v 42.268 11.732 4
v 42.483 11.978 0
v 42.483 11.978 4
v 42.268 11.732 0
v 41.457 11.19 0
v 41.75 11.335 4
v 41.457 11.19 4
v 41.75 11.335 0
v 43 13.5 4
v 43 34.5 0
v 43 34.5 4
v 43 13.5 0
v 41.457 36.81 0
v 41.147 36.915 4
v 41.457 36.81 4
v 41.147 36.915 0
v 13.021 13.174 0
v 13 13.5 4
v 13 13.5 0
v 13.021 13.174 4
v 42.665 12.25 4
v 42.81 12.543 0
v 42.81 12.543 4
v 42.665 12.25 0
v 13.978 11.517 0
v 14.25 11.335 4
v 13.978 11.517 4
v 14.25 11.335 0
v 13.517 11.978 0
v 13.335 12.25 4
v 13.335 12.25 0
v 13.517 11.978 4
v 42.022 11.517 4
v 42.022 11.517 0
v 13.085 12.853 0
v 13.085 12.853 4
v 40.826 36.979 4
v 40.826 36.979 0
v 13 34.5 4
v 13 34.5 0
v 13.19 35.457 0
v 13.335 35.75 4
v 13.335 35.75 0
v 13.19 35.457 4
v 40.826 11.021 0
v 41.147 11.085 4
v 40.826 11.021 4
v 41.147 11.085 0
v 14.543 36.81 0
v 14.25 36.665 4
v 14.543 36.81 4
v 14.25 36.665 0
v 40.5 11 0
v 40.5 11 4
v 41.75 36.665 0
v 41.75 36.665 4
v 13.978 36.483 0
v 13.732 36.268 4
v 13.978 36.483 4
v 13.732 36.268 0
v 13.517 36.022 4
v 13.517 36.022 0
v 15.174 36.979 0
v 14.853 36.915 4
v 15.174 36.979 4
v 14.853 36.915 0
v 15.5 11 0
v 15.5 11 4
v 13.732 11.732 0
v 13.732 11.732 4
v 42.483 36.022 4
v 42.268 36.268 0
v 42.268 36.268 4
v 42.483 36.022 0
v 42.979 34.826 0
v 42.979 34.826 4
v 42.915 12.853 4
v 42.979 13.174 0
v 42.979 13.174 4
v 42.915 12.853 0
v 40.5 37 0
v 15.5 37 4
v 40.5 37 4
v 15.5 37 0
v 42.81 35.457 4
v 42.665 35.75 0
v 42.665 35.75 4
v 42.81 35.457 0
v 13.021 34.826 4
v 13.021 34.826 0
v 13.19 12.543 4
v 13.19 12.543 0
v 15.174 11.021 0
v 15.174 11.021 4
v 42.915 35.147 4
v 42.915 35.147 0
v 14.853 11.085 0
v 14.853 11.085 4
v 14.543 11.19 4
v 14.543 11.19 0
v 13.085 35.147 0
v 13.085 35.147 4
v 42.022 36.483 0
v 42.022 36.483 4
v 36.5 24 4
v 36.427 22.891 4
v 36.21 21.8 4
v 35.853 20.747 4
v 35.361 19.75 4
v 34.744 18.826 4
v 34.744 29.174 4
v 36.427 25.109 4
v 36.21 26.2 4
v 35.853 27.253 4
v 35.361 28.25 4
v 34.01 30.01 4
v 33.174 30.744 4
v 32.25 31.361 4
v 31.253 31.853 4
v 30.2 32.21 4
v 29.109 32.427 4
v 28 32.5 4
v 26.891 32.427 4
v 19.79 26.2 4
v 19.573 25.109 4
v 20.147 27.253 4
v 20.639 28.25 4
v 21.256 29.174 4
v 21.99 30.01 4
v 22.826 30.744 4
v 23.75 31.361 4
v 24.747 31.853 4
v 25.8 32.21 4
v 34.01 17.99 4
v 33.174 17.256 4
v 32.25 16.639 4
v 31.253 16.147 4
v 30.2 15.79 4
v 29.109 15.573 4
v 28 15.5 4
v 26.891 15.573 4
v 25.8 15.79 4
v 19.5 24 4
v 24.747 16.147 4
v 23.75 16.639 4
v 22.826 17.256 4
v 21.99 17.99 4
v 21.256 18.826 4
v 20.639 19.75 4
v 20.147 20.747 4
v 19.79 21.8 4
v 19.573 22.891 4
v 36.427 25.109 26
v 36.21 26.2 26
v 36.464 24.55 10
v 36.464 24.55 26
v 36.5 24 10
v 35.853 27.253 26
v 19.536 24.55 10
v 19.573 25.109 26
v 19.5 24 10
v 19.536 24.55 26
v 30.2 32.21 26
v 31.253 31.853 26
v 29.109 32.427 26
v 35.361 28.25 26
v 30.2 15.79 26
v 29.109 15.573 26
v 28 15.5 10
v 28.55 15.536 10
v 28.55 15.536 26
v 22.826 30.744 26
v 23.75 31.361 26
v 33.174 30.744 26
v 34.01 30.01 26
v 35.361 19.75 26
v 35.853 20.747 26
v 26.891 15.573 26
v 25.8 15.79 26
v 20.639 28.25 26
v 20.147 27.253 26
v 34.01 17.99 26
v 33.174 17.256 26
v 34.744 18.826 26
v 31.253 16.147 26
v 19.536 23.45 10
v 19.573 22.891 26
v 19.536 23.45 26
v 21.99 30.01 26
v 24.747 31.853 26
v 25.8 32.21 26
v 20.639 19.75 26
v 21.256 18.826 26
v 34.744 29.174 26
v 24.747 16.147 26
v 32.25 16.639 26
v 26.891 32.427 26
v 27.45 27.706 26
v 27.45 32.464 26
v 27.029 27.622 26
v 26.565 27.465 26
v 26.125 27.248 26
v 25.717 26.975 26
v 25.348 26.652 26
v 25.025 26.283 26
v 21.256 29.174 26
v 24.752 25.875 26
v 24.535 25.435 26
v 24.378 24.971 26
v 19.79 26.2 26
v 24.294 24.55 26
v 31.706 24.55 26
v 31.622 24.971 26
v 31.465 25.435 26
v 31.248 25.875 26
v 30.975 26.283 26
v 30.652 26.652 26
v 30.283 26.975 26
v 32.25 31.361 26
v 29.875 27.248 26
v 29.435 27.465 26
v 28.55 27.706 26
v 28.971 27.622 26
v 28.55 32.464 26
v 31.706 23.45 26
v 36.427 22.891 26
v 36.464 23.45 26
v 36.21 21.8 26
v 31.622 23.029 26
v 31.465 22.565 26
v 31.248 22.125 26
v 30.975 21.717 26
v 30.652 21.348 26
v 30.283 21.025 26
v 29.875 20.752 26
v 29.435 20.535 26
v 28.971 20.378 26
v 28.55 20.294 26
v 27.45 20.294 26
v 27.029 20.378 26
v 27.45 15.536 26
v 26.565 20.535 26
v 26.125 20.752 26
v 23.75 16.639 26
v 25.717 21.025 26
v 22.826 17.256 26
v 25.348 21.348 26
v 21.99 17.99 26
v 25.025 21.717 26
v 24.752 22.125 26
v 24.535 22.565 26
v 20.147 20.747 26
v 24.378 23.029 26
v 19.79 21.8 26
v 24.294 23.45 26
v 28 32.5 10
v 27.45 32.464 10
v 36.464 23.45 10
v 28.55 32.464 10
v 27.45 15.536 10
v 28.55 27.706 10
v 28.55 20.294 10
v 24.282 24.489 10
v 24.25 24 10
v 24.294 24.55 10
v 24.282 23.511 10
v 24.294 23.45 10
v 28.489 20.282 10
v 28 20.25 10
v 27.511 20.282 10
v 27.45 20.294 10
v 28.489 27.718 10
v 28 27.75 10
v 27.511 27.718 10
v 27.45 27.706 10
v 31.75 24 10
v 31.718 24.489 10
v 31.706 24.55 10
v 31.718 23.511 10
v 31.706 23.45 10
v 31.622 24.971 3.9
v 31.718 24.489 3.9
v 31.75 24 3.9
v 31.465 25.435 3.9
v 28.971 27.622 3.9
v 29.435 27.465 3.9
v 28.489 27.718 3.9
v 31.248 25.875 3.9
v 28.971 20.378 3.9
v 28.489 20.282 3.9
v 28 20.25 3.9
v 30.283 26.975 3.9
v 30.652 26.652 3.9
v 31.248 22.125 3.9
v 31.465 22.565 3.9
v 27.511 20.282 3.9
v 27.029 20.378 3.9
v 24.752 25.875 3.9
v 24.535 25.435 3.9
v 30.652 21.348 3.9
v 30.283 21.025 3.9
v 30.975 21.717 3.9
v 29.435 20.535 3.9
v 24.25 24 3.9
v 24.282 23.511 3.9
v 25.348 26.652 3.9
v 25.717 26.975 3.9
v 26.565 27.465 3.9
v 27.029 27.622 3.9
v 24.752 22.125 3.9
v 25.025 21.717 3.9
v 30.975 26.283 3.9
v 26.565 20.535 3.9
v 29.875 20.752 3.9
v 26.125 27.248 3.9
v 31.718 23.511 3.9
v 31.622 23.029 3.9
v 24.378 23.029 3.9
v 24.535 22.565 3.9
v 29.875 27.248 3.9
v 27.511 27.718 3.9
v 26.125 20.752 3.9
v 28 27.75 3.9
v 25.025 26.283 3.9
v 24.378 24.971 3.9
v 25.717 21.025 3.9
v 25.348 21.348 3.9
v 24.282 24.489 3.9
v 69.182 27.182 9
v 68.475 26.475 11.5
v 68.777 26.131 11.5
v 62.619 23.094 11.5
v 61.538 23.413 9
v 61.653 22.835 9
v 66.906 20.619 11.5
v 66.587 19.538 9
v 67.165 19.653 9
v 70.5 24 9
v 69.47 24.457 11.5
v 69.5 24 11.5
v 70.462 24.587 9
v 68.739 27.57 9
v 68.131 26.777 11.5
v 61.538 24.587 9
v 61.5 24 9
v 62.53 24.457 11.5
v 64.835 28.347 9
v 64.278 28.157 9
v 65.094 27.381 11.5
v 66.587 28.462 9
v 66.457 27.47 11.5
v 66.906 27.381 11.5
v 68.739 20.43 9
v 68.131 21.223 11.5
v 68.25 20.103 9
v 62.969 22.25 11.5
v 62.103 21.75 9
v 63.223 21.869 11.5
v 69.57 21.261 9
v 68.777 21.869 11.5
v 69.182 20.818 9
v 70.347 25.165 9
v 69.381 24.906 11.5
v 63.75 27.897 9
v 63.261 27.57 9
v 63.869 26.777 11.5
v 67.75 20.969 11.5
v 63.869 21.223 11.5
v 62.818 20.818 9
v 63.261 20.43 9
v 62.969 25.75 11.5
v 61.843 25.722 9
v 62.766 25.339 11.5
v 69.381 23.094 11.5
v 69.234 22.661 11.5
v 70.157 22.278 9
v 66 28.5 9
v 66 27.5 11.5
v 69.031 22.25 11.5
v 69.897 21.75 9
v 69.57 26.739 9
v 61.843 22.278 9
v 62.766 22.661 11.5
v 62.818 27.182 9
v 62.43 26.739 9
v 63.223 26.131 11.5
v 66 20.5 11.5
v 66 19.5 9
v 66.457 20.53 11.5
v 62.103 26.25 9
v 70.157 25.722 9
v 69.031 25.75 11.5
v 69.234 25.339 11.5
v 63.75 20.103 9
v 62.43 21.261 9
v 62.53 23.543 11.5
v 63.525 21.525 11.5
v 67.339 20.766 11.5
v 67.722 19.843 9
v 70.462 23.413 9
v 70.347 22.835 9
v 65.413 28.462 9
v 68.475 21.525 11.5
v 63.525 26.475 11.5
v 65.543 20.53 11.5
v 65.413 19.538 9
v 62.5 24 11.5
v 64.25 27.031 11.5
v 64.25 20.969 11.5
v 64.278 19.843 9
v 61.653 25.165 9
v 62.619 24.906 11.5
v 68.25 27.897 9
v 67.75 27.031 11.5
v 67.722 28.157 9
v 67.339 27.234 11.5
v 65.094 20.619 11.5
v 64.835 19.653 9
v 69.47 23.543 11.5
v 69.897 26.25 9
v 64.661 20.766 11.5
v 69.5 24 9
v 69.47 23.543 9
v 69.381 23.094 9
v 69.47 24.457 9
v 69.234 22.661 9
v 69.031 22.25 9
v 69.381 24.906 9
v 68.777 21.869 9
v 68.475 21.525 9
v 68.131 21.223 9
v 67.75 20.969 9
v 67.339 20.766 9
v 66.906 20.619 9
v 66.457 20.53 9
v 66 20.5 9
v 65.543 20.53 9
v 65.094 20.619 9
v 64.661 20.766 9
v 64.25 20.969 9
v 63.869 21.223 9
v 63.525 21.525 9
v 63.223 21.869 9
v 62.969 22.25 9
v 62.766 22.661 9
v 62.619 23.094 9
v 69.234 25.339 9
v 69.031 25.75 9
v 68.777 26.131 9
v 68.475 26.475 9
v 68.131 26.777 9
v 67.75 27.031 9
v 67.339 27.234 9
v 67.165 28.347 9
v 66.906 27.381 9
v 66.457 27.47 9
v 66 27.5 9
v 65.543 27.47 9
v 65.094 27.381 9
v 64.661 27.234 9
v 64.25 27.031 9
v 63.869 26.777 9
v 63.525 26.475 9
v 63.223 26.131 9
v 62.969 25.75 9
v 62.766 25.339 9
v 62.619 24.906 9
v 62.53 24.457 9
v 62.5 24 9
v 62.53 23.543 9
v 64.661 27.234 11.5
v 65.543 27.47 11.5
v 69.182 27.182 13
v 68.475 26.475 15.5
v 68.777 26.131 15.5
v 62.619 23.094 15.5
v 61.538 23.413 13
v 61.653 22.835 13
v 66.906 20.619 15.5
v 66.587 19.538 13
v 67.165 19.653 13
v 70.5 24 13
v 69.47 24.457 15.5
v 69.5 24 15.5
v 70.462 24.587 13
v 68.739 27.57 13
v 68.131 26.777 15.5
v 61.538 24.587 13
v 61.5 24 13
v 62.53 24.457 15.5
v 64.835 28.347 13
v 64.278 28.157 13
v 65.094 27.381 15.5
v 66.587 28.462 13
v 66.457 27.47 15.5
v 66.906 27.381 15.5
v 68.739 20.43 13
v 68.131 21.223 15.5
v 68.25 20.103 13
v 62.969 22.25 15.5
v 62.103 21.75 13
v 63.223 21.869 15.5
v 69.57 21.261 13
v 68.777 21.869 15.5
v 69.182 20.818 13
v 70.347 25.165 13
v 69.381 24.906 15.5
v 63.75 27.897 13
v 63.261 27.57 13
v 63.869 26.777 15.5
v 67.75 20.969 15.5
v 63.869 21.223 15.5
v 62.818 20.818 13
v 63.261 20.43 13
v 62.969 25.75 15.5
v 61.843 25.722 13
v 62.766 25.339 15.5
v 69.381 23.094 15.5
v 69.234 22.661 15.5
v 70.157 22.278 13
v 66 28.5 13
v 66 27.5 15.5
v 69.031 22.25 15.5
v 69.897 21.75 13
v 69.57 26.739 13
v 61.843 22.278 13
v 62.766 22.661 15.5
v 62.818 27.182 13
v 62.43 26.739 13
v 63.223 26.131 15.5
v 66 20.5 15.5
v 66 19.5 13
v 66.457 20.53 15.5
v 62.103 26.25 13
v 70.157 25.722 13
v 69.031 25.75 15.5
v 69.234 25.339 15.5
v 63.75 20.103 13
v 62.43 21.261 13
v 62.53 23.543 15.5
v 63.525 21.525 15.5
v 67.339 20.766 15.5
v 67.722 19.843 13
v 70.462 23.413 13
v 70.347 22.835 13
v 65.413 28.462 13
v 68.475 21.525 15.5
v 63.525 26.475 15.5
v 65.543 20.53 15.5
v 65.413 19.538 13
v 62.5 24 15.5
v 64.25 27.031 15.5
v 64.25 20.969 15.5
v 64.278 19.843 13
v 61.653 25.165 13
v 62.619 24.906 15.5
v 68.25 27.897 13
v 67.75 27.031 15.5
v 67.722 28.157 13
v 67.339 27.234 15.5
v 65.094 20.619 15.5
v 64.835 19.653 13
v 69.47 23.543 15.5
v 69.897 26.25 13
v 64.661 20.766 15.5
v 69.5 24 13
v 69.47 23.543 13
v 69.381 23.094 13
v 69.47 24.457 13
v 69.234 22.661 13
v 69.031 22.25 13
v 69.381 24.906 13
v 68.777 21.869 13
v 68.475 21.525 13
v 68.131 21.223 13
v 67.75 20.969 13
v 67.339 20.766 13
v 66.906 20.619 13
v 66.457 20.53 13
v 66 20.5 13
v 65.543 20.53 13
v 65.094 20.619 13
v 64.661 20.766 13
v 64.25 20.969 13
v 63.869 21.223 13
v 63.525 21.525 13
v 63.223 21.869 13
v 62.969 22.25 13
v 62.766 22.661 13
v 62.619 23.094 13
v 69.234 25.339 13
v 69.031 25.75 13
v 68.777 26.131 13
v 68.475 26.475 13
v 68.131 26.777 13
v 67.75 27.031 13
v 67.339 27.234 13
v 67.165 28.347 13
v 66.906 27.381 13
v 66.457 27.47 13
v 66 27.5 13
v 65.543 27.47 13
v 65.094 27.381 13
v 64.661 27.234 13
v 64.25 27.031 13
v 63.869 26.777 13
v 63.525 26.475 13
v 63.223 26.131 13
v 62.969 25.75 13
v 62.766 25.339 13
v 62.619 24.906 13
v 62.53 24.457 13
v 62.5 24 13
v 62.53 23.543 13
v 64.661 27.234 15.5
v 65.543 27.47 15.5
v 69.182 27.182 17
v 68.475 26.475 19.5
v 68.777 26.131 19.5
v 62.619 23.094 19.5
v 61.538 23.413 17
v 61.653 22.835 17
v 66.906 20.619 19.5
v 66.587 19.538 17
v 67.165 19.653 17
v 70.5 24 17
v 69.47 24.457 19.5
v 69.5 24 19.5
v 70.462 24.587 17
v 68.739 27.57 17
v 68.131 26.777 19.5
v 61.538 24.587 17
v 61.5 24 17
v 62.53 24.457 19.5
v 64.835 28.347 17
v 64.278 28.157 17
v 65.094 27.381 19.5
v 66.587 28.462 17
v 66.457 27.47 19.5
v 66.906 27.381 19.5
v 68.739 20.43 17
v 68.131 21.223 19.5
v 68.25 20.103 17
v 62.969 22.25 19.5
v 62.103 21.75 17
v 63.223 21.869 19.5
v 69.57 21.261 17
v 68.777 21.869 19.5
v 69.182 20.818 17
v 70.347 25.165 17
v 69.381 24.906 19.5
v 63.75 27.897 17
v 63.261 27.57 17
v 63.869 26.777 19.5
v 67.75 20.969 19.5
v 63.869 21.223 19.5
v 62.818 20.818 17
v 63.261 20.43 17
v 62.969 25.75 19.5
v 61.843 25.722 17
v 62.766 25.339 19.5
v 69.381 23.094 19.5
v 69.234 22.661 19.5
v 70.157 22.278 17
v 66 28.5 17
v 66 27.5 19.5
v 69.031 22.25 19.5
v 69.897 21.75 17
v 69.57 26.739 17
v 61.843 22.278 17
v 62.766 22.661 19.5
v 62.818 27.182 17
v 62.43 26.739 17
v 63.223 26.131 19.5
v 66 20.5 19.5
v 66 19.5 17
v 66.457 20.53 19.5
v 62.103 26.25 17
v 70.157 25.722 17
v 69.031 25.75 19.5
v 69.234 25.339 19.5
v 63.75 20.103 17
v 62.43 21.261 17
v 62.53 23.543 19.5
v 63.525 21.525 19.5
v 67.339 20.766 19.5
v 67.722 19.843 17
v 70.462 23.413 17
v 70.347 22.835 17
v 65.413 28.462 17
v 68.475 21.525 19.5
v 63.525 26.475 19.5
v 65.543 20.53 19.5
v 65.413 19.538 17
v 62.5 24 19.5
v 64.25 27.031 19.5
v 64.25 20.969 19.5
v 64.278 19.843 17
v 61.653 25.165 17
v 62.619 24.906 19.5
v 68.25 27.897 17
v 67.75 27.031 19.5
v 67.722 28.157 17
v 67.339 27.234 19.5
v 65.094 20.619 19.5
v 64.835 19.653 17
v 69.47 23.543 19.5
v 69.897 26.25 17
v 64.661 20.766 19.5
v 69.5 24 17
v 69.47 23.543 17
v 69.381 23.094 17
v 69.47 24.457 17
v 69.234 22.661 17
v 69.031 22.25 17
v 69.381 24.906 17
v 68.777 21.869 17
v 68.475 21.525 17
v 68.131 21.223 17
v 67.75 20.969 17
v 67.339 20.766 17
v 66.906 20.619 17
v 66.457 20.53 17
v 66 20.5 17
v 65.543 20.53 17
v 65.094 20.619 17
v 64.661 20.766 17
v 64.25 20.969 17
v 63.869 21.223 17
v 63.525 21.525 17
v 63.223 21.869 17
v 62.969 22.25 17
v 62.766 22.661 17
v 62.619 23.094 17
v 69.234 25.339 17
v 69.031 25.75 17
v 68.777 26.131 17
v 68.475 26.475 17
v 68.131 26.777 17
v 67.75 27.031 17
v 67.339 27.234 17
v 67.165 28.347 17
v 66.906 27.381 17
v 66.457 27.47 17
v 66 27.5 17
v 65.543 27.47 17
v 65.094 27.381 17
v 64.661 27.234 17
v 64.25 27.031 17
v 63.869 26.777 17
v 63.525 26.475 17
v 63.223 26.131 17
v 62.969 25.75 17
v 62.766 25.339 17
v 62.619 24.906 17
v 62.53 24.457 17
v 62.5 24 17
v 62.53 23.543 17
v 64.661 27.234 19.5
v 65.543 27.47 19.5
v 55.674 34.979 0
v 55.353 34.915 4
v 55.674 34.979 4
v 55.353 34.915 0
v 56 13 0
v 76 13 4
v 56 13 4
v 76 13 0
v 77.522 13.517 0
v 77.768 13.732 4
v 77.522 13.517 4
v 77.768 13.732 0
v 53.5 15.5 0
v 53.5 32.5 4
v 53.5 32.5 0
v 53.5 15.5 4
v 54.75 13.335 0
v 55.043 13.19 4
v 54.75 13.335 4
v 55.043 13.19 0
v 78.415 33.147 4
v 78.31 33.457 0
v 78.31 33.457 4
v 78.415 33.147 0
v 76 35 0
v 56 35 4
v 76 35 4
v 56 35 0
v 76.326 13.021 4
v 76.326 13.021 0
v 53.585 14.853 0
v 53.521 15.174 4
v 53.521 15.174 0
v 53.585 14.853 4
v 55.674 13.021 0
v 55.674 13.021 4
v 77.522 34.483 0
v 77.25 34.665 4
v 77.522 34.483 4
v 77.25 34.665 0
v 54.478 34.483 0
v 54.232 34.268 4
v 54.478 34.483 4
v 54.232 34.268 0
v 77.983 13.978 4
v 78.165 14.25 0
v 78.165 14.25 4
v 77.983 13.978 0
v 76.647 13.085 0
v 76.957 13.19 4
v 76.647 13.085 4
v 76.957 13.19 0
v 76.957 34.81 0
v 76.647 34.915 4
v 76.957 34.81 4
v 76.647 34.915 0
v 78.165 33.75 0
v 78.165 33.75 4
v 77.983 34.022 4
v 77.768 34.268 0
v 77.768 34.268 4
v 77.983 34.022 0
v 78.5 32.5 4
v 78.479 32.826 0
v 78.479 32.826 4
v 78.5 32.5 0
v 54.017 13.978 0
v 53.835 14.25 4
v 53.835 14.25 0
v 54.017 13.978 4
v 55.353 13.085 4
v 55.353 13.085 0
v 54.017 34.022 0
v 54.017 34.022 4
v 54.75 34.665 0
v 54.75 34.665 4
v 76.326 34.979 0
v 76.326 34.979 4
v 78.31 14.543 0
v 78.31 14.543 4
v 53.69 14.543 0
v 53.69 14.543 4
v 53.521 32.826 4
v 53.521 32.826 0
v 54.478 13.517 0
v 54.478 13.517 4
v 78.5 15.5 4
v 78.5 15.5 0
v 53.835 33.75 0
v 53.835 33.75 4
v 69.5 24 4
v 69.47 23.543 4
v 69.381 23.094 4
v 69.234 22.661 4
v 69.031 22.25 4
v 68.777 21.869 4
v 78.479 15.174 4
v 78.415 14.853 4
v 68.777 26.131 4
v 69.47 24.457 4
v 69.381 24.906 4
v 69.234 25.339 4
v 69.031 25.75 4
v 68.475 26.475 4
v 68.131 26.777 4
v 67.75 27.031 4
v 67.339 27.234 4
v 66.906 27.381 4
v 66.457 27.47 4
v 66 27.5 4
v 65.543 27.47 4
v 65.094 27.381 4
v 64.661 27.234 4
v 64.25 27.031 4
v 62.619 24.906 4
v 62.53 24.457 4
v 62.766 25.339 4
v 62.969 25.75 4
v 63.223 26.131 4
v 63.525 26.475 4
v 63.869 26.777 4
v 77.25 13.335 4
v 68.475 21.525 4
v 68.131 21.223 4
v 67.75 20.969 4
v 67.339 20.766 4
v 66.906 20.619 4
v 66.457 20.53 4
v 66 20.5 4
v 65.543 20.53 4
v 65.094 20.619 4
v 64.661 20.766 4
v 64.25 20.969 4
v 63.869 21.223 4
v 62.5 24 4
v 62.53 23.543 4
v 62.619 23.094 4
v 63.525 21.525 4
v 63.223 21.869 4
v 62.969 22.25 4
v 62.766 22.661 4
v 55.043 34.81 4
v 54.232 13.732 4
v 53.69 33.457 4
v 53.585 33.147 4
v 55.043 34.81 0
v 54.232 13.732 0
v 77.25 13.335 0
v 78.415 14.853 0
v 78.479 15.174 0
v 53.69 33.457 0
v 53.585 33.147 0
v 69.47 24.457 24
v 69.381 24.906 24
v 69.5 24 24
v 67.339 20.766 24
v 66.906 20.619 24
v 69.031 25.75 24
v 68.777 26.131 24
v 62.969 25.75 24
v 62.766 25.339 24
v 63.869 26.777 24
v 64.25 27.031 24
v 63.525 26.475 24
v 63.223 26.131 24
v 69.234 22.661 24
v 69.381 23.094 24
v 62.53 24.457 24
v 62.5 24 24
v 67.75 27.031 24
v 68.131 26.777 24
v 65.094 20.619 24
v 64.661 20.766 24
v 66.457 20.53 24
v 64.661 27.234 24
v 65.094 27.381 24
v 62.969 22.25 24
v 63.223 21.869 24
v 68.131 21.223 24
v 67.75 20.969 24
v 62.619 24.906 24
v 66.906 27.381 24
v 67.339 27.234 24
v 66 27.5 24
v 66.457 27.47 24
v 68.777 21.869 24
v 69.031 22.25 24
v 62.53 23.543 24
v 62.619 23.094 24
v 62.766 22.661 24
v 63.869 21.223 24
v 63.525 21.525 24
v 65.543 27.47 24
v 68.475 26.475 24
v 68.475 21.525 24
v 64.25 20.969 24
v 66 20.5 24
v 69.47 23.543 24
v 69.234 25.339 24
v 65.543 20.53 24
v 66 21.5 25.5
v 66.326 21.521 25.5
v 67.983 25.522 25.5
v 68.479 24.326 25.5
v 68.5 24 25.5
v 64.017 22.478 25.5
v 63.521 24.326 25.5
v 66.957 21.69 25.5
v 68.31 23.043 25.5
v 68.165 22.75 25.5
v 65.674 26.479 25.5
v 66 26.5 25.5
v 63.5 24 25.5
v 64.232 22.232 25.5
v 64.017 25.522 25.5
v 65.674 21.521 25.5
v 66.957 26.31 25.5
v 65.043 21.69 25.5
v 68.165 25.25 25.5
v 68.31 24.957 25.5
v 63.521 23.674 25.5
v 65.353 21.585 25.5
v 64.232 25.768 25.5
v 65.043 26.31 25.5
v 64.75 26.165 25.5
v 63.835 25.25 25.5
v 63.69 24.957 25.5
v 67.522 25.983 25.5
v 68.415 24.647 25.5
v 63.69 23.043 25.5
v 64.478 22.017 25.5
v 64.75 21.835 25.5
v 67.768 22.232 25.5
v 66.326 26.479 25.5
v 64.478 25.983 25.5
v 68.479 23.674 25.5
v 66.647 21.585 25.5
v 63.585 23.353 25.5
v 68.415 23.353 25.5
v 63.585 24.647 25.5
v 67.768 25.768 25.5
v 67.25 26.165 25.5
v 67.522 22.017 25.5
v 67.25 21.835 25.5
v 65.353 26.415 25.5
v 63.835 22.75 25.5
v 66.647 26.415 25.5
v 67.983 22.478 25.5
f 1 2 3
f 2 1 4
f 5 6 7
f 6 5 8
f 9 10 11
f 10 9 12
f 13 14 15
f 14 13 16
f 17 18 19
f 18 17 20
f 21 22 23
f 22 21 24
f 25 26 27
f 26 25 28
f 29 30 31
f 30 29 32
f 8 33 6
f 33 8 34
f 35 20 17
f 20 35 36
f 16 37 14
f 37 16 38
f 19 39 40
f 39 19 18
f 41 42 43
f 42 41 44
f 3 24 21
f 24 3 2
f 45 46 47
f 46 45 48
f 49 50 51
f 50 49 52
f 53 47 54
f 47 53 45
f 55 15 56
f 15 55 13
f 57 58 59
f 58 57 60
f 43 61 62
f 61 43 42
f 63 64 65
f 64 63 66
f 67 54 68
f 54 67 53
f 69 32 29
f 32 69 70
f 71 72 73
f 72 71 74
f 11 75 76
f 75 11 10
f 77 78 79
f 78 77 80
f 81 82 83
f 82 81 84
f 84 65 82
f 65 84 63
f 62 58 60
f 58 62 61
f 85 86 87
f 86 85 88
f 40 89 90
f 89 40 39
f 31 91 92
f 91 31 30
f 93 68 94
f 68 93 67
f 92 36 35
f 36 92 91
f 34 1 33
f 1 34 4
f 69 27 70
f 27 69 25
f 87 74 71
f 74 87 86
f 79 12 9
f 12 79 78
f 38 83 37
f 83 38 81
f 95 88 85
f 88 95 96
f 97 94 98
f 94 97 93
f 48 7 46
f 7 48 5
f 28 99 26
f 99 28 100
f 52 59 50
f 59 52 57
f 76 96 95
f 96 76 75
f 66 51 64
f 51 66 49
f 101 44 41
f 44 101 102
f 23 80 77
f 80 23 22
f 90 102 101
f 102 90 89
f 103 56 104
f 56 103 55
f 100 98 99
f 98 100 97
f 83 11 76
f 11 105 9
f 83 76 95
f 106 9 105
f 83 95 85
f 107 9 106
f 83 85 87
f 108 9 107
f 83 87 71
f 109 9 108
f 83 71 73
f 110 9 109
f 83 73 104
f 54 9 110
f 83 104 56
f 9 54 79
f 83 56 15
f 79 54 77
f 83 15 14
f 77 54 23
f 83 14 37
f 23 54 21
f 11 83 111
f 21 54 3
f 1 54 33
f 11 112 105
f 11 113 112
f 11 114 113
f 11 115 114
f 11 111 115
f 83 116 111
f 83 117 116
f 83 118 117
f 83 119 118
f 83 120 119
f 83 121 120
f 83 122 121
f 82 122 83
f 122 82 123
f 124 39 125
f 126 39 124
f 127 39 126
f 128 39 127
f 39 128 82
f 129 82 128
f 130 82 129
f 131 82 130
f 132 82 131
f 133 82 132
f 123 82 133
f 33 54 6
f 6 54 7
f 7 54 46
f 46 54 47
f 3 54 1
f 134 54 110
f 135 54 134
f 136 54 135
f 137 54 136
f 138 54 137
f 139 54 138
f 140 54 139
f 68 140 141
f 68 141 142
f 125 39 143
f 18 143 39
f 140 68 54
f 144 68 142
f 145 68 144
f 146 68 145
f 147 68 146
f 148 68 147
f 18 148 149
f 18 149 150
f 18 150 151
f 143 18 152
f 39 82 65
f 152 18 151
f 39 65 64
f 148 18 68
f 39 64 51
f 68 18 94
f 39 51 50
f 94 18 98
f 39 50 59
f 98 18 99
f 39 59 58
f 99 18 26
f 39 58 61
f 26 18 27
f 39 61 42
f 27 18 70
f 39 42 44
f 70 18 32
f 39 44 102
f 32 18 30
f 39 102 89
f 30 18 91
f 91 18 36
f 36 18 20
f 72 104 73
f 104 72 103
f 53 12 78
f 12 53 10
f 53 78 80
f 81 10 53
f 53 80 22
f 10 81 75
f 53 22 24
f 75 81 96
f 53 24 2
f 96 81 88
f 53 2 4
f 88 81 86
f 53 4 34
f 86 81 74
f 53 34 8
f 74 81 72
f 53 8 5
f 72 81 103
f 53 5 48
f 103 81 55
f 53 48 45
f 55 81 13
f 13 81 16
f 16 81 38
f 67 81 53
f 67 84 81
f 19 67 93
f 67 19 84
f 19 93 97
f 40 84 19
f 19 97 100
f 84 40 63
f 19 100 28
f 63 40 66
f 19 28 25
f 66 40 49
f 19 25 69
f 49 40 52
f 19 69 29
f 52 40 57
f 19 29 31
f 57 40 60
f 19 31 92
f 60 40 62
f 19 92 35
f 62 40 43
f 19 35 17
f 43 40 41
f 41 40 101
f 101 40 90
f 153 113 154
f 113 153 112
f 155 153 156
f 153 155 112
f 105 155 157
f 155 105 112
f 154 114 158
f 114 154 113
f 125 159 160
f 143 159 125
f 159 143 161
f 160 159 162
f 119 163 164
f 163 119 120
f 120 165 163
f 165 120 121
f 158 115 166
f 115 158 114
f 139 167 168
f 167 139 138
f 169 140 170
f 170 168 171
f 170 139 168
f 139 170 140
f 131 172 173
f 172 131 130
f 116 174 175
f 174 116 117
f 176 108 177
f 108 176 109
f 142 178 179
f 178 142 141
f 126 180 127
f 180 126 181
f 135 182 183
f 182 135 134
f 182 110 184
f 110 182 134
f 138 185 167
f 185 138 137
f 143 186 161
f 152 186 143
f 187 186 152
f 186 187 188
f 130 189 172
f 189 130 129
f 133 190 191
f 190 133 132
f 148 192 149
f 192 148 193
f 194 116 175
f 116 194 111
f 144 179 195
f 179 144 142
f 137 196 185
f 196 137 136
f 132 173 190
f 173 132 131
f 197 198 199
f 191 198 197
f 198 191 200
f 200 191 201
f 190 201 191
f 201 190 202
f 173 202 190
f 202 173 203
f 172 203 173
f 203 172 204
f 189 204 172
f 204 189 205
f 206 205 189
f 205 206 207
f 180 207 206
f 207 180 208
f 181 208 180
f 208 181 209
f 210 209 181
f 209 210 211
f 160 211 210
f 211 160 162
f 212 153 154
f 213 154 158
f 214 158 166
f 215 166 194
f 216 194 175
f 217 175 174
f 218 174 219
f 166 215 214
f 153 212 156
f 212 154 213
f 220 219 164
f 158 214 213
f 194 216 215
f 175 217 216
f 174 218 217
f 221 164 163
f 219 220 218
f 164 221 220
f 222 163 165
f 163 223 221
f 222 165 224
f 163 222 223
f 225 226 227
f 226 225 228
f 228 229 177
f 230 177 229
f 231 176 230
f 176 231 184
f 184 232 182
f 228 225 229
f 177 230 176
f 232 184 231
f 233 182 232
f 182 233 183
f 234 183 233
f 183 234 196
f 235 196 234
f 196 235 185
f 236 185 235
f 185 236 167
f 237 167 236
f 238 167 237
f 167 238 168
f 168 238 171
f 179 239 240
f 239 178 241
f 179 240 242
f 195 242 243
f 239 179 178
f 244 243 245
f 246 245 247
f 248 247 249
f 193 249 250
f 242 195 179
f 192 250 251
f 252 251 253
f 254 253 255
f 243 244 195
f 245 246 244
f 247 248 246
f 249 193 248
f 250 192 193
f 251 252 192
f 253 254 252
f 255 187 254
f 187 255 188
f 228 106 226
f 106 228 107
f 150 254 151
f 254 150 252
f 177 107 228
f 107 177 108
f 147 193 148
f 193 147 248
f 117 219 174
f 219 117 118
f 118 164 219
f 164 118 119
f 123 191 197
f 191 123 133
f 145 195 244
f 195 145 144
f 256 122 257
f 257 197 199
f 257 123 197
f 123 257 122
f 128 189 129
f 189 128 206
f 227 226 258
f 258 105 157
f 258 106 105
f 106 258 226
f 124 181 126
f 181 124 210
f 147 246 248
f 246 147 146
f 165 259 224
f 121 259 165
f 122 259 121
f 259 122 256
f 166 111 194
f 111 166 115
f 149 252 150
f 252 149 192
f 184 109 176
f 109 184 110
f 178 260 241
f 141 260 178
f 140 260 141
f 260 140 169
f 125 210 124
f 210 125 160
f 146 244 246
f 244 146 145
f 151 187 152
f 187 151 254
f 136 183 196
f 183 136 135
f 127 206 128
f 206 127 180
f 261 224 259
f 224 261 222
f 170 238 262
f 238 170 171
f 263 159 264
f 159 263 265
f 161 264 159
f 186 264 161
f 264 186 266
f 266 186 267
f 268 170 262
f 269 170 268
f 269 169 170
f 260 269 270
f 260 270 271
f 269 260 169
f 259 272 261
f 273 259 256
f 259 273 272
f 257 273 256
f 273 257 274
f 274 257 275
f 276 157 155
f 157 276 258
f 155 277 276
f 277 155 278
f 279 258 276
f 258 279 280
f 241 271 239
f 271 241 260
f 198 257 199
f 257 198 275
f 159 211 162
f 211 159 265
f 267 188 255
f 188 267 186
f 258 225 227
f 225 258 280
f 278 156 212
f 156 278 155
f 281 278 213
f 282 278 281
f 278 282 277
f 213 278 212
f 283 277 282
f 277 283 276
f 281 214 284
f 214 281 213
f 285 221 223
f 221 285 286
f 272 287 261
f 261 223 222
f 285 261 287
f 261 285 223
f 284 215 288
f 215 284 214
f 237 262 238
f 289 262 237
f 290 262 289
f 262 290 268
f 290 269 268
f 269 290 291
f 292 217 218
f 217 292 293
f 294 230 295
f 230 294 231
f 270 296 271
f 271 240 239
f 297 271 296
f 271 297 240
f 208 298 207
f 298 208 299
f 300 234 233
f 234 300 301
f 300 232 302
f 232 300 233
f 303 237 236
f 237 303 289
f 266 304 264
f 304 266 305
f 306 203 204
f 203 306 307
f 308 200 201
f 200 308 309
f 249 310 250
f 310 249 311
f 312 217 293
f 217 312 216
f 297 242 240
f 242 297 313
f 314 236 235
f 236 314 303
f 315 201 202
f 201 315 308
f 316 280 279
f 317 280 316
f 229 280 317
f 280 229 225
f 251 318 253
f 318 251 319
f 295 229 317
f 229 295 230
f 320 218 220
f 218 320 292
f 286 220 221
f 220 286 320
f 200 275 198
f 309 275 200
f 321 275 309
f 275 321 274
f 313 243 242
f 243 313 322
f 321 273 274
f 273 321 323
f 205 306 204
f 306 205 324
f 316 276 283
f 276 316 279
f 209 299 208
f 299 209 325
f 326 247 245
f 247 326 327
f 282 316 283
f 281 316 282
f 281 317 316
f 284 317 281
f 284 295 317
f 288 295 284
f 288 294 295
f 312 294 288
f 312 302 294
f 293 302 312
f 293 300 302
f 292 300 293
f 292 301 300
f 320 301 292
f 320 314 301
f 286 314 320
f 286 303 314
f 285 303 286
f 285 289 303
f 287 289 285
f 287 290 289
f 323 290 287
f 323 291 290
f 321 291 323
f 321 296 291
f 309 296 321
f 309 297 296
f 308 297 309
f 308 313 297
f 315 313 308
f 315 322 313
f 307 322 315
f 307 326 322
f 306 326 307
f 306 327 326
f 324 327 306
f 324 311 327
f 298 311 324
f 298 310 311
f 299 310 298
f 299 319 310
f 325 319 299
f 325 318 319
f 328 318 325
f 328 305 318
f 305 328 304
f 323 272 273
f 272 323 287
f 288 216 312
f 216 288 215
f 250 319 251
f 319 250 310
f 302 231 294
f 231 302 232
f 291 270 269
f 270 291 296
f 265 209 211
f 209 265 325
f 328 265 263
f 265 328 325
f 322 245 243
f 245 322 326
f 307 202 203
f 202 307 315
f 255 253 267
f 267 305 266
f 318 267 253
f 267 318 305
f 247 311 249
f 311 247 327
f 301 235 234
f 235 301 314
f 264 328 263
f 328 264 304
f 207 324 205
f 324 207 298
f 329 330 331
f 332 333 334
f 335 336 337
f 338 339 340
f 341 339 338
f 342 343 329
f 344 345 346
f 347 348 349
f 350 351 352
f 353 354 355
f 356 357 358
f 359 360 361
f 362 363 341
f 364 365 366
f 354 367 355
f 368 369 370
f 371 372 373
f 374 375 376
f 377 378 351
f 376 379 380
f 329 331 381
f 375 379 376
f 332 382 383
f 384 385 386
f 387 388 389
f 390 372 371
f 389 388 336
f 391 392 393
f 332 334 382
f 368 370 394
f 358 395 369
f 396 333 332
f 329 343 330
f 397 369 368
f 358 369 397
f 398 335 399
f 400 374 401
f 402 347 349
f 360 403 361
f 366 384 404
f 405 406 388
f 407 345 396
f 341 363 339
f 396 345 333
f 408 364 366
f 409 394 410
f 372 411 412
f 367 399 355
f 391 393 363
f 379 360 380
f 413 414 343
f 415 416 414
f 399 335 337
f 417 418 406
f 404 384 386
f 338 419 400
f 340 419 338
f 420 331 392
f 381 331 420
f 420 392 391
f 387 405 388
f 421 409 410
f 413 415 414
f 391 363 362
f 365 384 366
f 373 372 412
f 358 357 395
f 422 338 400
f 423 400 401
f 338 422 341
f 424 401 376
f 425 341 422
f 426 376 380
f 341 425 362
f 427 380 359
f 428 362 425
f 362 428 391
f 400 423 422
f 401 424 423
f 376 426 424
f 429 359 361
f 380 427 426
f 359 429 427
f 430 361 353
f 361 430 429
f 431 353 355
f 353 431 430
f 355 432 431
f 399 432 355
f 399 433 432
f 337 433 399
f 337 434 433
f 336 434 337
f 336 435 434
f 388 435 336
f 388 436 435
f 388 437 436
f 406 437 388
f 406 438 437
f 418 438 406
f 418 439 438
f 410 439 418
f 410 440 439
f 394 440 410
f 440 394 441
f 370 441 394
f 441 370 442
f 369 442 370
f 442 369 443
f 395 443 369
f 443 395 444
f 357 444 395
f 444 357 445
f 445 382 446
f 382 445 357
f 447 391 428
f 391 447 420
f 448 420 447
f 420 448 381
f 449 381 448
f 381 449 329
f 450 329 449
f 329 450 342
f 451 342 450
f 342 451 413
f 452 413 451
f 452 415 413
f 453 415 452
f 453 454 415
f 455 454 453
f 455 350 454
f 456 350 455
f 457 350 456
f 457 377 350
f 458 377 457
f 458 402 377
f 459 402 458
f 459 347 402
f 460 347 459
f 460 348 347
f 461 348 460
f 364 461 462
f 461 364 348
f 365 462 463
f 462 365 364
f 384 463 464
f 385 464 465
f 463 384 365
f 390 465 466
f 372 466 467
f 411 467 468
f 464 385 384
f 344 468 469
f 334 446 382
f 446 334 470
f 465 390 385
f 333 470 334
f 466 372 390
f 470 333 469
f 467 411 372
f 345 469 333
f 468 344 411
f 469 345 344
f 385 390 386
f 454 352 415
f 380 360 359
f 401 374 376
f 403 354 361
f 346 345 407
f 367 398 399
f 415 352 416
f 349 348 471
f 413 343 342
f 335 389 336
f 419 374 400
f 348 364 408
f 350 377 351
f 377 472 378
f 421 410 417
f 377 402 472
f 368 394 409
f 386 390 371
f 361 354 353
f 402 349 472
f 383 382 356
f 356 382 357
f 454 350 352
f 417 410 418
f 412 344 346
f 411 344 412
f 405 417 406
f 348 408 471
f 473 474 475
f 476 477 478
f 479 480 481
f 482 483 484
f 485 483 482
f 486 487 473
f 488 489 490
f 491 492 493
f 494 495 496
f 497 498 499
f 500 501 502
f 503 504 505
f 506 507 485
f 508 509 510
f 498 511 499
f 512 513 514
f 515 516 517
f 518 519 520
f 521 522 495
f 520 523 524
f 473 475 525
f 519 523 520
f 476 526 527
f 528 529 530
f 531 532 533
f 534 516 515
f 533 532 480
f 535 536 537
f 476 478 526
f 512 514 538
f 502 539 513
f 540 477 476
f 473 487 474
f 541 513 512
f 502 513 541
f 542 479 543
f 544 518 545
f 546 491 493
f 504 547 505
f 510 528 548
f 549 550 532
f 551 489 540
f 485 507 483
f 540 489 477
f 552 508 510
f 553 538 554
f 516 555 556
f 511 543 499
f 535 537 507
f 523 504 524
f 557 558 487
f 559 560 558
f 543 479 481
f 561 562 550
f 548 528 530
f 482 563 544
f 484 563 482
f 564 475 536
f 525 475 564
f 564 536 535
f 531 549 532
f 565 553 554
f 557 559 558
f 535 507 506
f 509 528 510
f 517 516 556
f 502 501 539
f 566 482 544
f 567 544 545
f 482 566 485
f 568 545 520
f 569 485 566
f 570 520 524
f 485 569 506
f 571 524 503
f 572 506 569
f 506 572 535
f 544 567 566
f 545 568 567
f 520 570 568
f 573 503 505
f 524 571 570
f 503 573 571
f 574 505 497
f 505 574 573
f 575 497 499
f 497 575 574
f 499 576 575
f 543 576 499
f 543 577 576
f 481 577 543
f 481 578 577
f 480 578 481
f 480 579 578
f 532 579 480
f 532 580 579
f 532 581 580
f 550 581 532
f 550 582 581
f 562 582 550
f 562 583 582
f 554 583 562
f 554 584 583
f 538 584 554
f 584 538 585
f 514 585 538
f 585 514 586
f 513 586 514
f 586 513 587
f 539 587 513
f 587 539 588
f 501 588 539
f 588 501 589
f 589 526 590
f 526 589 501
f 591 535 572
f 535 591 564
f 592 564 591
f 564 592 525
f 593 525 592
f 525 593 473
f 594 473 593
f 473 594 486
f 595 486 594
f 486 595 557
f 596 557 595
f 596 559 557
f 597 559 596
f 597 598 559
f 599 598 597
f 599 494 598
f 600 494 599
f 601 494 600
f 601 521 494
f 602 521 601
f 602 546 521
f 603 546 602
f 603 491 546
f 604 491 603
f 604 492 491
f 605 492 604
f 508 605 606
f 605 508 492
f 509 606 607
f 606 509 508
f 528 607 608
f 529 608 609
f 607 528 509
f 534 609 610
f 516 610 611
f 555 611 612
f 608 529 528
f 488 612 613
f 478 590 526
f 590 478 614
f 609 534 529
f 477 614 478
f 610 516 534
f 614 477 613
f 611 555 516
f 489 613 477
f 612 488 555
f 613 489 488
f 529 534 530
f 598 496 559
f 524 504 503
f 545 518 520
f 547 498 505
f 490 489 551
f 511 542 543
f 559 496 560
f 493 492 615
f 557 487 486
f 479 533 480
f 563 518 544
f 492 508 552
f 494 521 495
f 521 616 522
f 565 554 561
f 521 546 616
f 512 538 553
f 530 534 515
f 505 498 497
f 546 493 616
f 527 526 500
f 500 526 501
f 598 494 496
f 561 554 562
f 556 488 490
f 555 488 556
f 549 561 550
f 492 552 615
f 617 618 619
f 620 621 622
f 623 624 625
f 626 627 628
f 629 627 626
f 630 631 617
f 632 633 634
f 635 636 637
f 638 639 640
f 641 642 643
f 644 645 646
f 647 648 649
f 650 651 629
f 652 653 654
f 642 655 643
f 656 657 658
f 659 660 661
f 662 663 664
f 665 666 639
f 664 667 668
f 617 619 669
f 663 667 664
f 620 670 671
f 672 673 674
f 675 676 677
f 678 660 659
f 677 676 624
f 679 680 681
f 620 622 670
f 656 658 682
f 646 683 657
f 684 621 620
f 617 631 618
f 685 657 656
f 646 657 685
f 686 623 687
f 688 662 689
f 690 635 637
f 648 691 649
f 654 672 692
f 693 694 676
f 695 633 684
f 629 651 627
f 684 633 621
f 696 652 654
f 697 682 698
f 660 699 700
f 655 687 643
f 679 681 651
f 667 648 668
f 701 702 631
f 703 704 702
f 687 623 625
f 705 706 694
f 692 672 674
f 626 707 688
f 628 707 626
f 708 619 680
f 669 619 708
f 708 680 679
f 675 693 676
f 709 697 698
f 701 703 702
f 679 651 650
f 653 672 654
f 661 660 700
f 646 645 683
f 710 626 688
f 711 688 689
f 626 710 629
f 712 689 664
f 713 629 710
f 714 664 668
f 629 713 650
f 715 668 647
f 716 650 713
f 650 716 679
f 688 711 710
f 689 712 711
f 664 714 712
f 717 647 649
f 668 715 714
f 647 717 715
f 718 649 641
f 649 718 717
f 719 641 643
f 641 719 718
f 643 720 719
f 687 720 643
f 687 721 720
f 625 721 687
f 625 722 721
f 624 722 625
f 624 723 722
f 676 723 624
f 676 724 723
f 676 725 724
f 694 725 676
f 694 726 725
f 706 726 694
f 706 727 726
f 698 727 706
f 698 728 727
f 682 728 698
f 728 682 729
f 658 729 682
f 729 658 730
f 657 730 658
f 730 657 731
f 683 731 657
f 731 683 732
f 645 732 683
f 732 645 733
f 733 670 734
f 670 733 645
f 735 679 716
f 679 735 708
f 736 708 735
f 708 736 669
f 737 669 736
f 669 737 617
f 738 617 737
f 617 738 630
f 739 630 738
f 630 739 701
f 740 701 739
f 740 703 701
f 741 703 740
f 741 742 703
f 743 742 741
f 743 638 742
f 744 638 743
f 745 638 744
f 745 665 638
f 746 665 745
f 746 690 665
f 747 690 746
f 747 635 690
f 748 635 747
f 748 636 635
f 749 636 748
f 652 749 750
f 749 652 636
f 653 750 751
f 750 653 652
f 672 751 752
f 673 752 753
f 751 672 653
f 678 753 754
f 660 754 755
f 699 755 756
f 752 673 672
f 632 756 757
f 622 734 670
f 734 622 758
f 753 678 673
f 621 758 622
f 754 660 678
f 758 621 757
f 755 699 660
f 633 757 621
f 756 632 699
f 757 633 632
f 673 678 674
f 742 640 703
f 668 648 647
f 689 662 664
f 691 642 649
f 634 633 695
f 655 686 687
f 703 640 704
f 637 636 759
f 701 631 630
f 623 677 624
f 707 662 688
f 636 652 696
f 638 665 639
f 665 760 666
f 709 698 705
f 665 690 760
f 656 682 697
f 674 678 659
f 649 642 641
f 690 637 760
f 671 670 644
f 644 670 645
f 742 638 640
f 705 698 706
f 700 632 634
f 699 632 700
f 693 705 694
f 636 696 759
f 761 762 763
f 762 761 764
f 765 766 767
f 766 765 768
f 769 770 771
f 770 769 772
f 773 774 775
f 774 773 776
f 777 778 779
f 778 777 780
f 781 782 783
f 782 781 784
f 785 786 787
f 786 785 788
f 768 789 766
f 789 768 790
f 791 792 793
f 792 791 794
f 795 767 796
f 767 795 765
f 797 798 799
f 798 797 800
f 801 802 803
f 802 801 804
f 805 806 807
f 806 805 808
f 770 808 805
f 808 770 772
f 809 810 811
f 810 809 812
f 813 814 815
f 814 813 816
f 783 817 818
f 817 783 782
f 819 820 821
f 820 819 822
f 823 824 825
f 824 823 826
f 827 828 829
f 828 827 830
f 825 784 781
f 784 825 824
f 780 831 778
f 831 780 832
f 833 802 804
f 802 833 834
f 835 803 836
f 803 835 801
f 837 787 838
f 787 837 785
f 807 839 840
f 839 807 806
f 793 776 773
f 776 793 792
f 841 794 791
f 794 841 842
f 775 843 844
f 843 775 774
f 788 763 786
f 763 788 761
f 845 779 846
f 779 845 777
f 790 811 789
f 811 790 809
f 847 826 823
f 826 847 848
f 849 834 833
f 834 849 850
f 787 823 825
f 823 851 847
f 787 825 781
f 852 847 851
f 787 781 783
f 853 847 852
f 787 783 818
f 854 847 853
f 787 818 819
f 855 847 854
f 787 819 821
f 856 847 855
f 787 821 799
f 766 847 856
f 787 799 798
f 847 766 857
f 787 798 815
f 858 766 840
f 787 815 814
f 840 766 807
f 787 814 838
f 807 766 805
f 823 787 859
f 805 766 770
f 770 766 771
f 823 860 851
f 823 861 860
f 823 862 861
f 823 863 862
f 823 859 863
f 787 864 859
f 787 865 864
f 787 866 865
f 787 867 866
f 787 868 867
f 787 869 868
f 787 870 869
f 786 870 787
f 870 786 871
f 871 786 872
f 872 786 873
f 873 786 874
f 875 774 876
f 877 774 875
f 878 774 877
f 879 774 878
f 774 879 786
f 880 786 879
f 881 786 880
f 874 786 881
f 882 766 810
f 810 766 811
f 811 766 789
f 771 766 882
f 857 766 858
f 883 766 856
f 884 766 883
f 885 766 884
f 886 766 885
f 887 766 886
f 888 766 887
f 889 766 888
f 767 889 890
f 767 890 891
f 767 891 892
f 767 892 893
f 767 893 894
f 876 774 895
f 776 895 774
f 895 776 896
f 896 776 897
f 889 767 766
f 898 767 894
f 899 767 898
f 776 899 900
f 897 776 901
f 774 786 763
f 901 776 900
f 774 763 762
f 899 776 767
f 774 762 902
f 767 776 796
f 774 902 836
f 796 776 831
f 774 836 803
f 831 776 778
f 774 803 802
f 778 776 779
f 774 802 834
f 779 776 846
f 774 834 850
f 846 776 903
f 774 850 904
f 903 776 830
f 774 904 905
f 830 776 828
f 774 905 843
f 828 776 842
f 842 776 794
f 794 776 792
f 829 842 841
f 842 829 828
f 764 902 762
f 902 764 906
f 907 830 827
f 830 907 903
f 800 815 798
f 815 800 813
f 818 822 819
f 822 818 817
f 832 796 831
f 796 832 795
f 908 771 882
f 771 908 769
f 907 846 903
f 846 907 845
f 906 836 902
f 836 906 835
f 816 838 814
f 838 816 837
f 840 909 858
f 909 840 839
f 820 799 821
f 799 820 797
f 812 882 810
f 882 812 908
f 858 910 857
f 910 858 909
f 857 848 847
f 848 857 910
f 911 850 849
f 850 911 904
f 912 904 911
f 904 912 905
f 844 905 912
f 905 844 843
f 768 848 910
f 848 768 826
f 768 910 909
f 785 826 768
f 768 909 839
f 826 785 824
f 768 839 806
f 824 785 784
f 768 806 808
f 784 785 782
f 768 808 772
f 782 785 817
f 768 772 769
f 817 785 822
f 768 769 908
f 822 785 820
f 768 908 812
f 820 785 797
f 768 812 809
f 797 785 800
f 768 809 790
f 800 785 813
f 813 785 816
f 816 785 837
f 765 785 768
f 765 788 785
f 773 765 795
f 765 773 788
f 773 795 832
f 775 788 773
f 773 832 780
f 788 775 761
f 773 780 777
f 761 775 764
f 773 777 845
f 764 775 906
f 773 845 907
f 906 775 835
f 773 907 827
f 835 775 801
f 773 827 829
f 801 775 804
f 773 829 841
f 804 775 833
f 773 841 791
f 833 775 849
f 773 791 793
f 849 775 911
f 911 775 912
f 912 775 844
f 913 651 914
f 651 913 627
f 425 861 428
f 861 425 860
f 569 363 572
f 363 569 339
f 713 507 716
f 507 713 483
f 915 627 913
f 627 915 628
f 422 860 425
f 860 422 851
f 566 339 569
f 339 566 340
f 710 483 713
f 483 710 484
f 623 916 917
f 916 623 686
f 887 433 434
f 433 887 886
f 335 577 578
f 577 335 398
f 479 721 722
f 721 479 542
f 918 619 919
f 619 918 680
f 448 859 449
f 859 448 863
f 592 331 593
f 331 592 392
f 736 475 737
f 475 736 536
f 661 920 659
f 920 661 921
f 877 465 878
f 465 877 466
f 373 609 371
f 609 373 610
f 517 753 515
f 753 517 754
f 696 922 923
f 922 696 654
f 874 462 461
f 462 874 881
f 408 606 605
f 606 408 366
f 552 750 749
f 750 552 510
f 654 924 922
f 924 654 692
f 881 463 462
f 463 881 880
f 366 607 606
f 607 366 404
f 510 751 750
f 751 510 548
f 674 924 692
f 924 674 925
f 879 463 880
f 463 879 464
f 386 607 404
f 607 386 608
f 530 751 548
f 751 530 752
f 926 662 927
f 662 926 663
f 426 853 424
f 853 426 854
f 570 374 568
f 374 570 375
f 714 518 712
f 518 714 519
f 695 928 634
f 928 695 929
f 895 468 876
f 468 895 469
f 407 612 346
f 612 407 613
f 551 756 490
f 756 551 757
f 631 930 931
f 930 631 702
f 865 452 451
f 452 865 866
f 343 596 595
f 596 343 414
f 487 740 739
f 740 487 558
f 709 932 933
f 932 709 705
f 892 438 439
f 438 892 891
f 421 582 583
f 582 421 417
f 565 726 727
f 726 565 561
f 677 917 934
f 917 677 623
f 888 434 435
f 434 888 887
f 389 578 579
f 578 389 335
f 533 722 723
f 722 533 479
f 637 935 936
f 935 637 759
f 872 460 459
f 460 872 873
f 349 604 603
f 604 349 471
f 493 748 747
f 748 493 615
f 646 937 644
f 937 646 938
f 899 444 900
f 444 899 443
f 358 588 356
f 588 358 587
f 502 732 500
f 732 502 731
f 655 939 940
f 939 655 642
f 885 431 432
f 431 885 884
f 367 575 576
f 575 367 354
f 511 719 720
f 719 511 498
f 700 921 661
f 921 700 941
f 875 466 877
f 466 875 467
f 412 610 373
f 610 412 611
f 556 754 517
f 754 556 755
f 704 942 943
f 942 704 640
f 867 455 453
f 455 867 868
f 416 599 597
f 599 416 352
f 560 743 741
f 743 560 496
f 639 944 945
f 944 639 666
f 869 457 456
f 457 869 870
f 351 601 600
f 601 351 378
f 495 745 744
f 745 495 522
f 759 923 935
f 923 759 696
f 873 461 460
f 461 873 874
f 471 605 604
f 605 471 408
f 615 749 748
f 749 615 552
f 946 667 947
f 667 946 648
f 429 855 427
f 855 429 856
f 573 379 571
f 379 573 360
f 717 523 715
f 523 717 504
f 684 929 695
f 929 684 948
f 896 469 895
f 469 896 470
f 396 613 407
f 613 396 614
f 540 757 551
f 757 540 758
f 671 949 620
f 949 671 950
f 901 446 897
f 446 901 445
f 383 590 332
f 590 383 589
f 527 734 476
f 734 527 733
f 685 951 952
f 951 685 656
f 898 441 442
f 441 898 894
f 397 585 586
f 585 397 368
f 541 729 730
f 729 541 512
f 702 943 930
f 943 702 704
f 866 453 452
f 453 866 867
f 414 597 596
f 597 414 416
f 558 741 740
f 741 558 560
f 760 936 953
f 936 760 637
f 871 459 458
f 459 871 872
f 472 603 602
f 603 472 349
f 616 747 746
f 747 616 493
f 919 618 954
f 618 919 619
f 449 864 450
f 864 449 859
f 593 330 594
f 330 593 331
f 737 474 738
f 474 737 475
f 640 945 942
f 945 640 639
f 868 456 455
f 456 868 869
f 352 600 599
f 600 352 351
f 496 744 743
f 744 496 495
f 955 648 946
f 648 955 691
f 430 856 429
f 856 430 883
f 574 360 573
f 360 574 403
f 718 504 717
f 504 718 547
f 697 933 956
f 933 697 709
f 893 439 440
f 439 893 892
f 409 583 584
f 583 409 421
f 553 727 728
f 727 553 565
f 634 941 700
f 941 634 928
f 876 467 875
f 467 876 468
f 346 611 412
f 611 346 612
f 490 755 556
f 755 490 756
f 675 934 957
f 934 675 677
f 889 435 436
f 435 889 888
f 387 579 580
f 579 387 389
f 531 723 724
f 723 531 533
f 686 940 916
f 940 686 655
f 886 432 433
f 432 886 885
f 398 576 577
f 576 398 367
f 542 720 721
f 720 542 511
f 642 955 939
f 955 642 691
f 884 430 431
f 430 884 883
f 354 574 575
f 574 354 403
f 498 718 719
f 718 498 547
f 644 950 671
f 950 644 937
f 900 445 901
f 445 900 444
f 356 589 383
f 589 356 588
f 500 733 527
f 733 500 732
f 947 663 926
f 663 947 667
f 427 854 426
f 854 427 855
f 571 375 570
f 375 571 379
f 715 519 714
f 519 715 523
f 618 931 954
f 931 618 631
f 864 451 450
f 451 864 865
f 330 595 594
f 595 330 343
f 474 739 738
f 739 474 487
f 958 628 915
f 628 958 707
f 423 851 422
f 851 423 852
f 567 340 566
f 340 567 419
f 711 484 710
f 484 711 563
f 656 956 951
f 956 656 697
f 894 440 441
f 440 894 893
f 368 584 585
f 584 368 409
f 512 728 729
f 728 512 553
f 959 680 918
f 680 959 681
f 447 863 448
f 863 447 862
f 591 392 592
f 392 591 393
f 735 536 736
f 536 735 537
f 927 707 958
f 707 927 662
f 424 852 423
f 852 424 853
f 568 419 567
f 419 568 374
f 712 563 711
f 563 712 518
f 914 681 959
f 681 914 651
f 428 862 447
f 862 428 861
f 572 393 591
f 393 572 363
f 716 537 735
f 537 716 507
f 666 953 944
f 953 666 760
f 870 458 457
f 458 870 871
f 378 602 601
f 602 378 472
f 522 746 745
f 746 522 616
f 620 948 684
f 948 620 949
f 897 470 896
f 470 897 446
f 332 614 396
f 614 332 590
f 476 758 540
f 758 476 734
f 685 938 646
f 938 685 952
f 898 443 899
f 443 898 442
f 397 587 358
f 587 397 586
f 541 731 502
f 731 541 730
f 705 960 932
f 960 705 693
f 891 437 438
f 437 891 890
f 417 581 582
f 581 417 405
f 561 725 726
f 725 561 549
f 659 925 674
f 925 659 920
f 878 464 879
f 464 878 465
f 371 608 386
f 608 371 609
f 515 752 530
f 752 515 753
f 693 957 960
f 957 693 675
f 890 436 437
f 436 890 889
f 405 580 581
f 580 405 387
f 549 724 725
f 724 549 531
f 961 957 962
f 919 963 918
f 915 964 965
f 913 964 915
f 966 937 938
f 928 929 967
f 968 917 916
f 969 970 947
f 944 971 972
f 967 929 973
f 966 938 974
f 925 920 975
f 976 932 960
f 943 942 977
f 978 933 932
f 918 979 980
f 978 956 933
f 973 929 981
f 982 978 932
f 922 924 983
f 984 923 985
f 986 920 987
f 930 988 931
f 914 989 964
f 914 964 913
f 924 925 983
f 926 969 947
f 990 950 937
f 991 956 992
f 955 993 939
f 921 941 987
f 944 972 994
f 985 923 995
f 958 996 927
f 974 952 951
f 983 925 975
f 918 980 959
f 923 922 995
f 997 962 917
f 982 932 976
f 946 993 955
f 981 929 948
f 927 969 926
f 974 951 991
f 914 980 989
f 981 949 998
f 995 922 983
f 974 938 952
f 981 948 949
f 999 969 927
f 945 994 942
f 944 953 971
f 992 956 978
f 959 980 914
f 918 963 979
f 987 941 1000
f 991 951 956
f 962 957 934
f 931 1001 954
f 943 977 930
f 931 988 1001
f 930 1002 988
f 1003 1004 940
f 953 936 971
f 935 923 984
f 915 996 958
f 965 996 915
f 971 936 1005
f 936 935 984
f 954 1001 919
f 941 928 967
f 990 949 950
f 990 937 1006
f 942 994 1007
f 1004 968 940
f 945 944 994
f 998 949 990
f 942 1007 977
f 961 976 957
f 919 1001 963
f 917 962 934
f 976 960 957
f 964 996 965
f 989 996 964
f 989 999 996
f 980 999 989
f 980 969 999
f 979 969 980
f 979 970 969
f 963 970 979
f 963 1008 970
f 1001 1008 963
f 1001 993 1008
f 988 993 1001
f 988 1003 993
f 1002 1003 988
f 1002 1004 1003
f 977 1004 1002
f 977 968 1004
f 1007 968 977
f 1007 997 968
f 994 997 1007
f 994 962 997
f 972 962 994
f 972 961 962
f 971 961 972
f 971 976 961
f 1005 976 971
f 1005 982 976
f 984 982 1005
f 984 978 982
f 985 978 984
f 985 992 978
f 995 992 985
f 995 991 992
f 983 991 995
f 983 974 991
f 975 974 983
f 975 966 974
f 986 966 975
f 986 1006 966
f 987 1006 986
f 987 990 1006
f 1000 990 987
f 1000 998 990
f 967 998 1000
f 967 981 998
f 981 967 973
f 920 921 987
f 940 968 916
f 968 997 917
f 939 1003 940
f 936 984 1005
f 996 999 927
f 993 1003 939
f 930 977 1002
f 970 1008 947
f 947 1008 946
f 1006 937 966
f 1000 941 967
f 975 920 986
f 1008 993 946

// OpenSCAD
/*
Sample 046: Einweg-Steckverbinder mit Widerhaken — 0,25 mm
Generated from the FDM Mechanical Sample Library.
Units: millimetres.

Override examples:
  openscad -o custom.stl -D 'view="plate"' -D 'render_fn=64' model.scad
  openscad -o preview.png -D 'view="assembly"' model.scad
*/
use <../../../library/fdm_mechanisms.scad>

render_fn = is_undef(render_fn) ? 48 : render_fn;
view = is_undef(view) ? "plate" : view;
$fn = render_fn;

sample_barbed_connector(
    view=view,
    clearance=0.25,
    pin_d=7,
    barb_h=1
);
